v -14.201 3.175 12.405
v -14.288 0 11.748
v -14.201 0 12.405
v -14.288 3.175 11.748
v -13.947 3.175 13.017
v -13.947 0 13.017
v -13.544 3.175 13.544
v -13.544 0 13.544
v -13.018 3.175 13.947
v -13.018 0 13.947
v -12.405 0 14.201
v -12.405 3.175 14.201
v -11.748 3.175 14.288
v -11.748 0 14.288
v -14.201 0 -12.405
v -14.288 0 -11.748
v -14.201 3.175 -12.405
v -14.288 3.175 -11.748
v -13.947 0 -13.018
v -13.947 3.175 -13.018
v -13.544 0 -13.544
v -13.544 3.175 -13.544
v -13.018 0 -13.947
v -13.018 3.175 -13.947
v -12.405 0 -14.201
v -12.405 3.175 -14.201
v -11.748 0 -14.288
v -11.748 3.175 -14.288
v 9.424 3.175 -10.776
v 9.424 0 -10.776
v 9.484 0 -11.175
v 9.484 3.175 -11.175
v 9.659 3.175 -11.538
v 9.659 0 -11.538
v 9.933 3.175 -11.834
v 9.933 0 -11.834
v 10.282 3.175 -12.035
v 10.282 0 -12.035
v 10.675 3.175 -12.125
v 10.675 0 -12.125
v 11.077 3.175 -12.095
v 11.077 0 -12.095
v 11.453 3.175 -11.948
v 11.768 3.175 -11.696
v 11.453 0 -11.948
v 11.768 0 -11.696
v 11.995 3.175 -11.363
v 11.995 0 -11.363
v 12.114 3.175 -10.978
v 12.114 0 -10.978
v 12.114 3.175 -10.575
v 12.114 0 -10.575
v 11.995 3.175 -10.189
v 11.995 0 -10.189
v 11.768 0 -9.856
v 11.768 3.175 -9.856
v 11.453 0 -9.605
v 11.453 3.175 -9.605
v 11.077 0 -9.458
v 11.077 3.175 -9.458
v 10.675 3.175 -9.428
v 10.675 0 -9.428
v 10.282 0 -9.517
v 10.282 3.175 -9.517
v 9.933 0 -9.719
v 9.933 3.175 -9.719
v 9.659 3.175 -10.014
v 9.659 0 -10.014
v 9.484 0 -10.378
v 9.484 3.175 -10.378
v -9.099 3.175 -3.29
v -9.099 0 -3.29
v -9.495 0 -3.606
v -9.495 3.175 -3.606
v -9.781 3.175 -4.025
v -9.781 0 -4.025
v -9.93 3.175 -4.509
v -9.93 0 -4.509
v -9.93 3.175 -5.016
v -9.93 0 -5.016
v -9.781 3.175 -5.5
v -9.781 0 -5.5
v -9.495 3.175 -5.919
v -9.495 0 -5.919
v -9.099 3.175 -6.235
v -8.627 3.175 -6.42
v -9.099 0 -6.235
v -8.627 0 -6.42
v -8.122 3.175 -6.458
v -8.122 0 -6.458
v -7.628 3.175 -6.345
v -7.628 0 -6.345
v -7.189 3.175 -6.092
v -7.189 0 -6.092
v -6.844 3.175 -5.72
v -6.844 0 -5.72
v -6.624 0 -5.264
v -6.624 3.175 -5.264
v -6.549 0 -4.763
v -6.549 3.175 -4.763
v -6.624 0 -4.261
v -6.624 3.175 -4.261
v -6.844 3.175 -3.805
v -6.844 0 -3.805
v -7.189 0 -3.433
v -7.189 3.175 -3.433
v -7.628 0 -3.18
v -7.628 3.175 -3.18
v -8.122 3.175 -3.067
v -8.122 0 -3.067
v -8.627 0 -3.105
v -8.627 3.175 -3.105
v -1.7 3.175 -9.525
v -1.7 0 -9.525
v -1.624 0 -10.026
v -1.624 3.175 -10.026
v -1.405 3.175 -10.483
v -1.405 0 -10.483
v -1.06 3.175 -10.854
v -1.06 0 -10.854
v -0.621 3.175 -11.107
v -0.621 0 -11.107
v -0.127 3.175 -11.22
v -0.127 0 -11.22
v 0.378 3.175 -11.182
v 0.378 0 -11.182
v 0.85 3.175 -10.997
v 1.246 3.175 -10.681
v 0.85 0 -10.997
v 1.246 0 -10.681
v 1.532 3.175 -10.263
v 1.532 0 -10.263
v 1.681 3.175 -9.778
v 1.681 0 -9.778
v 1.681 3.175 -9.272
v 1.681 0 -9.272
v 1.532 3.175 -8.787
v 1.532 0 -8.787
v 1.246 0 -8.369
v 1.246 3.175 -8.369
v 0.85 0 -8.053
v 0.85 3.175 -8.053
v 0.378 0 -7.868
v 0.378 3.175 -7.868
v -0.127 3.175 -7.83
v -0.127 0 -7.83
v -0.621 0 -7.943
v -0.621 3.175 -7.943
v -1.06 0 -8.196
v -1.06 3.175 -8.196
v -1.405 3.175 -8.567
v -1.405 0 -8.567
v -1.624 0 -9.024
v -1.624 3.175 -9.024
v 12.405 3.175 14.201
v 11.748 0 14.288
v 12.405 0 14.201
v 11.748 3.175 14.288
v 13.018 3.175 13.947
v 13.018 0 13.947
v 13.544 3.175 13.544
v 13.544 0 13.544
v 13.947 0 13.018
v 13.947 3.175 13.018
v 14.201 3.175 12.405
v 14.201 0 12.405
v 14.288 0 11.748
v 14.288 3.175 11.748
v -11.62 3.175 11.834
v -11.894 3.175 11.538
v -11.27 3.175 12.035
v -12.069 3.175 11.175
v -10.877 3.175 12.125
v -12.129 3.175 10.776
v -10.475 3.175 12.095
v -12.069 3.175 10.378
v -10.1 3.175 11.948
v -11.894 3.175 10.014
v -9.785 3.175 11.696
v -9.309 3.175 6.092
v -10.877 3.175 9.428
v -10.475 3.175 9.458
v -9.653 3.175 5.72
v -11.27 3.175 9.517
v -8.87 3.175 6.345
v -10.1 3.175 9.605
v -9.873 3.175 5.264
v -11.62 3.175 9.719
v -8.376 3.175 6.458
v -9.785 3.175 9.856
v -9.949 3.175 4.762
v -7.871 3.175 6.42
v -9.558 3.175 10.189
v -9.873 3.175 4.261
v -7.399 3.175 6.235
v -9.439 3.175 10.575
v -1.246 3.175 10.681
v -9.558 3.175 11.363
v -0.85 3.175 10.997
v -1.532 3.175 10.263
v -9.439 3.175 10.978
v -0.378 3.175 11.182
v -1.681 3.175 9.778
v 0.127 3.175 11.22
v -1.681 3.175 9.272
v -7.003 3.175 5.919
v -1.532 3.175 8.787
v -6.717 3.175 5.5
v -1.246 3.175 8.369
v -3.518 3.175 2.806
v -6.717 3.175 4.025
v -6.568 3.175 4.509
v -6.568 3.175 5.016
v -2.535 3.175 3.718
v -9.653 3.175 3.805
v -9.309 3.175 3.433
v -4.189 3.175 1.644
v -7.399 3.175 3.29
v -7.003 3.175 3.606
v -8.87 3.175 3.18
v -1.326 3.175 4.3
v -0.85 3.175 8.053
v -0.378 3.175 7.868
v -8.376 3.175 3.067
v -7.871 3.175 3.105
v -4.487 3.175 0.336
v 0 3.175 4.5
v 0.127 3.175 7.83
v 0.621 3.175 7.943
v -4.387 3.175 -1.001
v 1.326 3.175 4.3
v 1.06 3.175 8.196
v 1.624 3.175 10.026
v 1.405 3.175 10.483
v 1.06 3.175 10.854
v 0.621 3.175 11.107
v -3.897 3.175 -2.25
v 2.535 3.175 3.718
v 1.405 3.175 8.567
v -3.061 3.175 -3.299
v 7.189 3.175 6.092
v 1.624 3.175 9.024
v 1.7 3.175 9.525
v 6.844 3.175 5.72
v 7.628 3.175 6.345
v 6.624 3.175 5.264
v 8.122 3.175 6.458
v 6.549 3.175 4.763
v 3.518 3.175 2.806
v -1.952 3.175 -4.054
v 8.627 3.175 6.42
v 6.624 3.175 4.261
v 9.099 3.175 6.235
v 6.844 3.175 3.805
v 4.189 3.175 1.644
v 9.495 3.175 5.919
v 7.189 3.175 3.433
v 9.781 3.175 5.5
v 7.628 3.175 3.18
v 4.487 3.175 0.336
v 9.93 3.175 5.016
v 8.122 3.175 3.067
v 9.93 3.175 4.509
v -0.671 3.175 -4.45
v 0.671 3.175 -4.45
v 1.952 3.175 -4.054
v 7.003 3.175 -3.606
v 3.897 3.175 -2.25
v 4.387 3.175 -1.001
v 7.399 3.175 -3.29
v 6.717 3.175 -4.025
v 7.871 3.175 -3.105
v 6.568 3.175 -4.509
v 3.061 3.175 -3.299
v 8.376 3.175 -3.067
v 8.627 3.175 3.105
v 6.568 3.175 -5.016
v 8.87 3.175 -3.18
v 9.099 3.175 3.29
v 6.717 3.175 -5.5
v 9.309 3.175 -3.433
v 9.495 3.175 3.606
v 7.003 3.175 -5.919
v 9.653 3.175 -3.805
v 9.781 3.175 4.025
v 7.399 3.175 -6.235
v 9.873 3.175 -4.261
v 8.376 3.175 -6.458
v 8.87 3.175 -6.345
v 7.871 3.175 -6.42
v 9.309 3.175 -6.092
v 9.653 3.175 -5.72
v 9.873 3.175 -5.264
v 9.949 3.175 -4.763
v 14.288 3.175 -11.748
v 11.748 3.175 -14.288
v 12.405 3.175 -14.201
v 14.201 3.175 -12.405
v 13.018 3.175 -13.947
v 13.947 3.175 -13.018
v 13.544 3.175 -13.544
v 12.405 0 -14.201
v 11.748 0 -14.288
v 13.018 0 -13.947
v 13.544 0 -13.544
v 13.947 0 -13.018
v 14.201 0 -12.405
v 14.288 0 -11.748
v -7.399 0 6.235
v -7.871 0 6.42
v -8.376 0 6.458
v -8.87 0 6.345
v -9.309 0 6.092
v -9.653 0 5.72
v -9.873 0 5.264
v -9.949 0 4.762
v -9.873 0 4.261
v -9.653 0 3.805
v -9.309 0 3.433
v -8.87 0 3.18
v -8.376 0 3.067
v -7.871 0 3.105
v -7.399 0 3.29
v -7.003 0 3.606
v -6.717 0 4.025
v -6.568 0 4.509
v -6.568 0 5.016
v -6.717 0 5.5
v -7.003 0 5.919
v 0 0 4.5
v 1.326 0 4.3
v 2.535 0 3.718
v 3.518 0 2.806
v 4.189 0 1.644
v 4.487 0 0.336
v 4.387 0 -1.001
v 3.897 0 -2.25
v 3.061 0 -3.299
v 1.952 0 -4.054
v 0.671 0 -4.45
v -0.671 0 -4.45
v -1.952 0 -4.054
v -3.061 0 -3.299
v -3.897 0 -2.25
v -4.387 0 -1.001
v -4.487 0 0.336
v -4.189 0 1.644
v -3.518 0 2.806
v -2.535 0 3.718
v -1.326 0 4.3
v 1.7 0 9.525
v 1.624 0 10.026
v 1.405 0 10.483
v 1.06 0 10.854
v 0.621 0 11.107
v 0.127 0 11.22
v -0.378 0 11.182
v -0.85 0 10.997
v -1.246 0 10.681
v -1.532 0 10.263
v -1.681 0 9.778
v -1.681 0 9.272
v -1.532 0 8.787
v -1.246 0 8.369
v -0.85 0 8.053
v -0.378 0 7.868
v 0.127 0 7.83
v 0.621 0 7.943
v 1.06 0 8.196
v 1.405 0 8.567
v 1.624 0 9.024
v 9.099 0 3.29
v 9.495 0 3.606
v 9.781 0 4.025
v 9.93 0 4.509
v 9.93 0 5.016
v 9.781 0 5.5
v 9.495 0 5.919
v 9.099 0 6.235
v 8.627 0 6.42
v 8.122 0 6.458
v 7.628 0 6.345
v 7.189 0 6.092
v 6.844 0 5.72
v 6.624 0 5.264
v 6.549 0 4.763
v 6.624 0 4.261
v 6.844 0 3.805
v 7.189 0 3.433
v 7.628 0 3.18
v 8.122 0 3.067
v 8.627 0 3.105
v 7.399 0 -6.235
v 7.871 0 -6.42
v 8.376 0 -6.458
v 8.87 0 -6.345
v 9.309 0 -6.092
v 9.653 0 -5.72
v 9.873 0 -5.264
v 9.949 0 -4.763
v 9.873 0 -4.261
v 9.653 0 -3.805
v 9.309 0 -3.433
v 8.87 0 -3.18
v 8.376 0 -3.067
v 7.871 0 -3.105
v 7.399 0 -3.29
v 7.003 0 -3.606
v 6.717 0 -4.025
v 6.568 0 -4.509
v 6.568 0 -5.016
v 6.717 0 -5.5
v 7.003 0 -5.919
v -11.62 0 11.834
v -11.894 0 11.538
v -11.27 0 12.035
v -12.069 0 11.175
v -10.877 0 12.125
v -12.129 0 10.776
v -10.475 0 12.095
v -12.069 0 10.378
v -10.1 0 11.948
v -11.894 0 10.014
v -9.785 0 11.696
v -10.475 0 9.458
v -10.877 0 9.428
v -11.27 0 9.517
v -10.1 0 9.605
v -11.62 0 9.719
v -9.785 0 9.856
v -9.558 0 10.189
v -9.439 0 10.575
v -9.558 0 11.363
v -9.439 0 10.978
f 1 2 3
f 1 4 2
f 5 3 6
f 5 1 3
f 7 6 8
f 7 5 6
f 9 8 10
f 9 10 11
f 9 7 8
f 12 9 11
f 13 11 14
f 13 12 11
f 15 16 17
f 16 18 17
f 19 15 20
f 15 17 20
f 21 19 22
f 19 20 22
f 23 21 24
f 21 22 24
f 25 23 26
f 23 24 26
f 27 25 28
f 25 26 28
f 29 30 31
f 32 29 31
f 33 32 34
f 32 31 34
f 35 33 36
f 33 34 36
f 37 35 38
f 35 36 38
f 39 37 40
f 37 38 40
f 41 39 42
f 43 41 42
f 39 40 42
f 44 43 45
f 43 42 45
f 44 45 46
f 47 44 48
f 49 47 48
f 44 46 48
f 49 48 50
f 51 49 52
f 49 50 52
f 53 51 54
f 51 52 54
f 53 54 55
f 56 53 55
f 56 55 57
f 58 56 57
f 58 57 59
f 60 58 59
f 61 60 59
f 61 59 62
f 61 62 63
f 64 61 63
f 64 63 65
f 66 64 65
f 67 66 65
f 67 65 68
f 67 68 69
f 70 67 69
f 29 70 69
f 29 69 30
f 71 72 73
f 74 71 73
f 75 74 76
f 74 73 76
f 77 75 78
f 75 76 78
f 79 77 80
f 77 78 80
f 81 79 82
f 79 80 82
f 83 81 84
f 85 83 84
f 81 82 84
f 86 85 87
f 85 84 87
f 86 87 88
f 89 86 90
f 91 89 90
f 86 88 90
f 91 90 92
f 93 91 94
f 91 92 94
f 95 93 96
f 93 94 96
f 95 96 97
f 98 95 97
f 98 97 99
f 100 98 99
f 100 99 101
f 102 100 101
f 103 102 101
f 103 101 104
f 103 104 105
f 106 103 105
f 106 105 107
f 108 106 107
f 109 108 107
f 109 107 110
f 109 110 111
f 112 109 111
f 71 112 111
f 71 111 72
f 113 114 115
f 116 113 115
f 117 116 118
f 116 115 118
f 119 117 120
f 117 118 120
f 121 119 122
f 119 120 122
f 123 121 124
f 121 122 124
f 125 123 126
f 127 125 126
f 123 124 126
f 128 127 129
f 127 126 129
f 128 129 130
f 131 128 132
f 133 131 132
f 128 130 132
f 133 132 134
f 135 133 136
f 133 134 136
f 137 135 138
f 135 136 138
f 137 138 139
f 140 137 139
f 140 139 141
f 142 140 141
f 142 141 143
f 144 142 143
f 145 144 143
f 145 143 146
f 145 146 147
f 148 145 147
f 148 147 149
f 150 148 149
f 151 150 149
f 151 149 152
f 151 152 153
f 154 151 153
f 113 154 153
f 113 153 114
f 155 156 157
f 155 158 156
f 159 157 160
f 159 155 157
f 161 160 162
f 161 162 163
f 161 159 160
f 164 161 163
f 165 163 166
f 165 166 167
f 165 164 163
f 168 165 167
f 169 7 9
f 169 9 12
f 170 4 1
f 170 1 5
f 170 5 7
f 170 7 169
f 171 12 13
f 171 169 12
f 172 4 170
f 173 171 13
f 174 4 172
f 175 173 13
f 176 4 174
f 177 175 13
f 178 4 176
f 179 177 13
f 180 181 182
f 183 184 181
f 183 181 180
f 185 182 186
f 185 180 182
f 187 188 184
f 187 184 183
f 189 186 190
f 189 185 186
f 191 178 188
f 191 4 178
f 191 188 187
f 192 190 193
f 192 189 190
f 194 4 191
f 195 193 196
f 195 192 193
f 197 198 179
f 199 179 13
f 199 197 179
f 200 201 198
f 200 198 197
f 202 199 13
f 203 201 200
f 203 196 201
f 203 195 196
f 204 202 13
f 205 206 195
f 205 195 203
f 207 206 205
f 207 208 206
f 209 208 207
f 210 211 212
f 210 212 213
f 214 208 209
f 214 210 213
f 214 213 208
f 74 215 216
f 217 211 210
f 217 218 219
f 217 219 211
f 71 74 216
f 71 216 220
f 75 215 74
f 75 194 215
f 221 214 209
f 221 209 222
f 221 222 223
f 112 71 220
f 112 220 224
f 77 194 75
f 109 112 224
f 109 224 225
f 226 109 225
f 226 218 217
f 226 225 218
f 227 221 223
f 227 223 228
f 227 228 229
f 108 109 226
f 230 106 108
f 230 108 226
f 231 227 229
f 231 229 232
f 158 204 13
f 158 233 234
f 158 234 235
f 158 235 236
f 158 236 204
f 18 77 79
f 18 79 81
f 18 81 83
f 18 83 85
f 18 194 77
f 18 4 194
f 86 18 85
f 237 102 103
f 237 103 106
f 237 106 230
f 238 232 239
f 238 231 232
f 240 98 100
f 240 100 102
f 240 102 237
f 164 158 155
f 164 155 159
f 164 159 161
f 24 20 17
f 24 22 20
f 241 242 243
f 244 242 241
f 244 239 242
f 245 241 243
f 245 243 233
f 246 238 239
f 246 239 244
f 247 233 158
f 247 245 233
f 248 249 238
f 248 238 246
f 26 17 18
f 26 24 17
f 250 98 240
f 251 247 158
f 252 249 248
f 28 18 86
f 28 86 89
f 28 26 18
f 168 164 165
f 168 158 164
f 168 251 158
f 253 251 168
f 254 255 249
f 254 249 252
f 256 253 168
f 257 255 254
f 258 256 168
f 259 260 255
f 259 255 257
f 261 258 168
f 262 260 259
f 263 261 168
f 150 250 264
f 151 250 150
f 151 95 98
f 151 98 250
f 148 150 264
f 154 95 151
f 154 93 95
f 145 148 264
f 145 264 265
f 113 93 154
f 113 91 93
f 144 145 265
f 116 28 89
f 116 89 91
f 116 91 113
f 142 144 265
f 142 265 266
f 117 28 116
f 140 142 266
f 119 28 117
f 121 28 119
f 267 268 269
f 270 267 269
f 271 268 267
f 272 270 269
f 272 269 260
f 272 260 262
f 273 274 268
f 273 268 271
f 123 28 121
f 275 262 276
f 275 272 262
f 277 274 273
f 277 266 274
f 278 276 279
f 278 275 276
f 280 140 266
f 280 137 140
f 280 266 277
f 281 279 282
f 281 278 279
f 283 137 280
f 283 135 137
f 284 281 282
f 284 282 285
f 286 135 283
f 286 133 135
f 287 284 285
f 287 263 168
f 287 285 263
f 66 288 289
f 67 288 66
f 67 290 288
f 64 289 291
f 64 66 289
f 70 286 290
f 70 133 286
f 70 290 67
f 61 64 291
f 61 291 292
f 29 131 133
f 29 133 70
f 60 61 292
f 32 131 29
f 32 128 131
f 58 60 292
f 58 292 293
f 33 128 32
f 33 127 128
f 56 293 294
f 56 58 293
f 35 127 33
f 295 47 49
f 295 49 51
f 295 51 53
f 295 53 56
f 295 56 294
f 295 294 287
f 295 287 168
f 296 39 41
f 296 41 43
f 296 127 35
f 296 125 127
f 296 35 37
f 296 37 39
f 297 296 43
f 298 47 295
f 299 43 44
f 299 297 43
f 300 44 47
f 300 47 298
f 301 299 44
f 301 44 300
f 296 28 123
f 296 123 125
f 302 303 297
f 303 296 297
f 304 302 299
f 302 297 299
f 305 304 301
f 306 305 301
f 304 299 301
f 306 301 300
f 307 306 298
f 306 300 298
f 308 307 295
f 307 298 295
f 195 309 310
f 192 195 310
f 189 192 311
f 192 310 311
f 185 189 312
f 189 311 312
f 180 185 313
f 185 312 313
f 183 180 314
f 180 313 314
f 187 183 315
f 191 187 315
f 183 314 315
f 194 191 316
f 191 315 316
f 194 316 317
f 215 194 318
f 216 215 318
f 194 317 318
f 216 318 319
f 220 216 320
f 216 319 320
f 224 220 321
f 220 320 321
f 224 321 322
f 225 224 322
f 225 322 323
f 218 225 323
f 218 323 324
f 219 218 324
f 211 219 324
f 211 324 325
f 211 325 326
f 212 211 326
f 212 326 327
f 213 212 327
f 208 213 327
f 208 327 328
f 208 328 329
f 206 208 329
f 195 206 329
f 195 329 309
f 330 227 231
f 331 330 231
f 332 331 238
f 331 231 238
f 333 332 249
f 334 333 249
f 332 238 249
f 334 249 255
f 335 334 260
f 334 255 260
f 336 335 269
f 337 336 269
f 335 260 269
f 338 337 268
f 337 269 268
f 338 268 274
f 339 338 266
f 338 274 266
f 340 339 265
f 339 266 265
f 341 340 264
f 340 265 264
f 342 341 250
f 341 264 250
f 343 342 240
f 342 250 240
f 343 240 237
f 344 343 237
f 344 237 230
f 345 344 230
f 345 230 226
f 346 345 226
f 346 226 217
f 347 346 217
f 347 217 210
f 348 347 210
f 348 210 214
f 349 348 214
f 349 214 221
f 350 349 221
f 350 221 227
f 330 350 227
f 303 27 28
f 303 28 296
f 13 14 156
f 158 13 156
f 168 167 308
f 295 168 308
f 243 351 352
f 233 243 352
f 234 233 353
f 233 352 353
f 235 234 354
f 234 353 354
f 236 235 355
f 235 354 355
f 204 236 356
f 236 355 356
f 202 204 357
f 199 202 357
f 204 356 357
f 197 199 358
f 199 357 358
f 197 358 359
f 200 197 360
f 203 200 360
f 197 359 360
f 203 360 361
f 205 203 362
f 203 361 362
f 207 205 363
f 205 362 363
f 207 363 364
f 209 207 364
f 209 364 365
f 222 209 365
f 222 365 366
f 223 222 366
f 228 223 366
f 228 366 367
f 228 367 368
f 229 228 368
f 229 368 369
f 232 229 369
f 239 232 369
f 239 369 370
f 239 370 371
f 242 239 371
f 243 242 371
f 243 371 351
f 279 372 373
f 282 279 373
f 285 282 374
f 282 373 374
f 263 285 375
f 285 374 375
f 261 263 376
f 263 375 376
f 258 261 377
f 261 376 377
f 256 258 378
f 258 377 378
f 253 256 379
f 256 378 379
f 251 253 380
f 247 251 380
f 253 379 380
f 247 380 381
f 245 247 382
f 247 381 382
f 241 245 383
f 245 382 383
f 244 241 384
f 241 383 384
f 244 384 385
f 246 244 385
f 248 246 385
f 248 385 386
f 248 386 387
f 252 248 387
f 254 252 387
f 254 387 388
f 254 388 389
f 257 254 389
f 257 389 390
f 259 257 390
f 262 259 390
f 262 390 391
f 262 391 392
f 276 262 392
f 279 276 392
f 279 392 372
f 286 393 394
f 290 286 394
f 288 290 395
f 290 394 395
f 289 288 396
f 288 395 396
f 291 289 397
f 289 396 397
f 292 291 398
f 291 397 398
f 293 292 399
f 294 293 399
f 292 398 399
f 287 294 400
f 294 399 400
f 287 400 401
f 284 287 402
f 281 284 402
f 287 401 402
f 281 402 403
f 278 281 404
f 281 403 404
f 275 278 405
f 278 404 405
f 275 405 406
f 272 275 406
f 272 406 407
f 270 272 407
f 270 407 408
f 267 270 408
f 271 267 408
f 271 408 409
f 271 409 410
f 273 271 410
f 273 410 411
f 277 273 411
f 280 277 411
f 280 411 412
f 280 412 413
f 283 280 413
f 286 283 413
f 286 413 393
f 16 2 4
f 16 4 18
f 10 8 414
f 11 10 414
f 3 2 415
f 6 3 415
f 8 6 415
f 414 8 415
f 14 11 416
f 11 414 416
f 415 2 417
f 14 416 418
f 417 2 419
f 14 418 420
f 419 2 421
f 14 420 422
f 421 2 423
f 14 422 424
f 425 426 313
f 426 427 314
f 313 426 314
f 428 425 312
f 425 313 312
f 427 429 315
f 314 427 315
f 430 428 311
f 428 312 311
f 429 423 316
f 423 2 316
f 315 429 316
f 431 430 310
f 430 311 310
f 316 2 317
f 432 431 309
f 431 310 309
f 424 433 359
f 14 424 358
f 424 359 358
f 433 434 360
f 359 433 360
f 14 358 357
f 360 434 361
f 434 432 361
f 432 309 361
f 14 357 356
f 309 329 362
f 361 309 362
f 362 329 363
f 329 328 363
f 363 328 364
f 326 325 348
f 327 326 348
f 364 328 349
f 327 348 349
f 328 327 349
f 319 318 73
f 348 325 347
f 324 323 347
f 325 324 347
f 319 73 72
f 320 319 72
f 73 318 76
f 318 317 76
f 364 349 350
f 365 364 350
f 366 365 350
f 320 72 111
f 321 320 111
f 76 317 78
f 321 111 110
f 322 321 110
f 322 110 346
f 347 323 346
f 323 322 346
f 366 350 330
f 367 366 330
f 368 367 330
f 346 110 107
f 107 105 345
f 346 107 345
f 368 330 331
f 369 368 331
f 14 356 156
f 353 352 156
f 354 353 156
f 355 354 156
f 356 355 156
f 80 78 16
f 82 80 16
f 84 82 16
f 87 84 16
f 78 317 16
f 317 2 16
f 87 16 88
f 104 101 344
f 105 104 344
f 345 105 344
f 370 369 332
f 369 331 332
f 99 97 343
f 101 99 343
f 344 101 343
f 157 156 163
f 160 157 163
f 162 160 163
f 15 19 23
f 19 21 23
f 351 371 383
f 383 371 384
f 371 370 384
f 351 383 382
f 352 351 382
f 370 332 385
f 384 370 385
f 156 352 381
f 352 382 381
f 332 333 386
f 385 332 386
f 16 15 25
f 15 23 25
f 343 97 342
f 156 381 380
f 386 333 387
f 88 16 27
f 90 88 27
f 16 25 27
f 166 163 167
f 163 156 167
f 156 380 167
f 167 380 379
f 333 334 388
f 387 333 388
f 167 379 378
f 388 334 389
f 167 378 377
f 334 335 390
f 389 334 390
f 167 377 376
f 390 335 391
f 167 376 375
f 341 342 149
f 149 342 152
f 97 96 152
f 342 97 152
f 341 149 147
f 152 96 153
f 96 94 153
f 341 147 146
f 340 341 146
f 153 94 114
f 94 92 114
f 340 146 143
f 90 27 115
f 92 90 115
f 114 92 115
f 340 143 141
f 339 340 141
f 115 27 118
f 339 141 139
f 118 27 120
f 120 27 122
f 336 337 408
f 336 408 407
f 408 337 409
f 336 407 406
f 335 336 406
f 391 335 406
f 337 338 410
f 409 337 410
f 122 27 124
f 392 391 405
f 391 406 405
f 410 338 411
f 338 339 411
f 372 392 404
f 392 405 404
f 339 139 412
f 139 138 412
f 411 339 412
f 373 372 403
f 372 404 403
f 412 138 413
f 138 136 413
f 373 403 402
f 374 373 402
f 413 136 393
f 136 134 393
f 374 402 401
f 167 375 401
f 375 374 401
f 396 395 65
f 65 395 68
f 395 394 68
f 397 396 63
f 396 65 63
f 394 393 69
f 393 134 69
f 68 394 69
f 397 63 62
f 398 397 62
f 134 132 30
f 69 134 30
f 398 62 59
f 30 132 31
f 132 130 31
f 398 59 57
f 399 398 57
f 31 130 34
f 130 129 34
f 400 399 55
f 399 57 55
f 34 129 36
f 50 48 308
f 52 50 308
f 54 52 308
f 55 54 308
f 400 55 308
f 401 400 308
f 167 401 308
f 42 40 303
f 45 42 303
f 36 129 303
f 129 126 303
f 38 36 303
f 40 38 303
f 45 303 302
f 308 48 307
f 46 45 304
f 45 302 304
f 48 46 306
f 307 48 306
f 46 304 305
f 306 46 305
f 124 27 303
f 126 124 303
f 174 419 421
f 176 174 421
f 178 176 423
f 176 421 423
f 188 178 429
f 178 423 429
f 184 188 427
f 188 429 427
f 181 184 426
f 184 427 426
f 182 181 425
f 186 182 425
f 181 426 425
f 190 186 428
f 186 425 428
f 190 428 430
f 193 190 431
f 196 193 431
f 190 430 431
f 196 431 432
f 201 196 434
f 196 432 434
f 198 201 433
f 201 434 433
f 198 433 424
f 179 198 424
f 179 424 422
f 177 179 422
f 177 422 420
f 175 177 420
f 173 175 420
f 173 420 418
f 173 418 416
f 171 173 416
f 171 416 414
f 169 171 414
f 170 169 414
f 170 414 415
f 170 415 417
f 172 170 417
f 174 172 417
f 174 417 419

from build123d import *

# Parameters (mm, degrees)
SKETCH1_W             = 28.575
SKETCH1_H             = 28.575
BOSS_EXTRUDE1_DEPTH   = 3.175
M3_CLEARANCE_HOLE1_D  = 3.4
SKETCH2_R             = 4.5
CUT_EXTRUDE2_DEPTH    = 21.453506729
CIRPATTERN1_COUNT     = 6
F_6_32_TAPPED_HOLE1_D = 2.7051
FILLET1_R             = 2.54


with BuildPart() as part:
    # Sketch1 → Boss-Extrude1 (new body)
    with BuildSketch(Plane(origin=(0, 0, 0), x_dir=(1, 0, 0), z_dir=(0, 1, 0))):
        Rectangle(SKETCH1_W, SKETCH1_H)
    extrude(amount=BOSS_EXTRUDE1_DEPTH)

    # M3 Clearance Hole1 (through all)
    with Locations(Plane(origin=(0, 3.175, 0), x_dir=(1, 0, 0), z_dir=(0, 1, 0))):
        with Locations((0, 9.525)):
            m3_clearance_hole1 = Hole(M3_CLEARANCE_HOLE1_D / 2)

    # Sketch2 → Cut-Extrude2 (cut, through all)
    with BuildSketch(Plane(origin=(0, 3.175, 0), x_dir=(1, 0, 0), z_dir=(0, 1, 0))):
        with Locations(Location((0, 0, 0), (0, 0, 270))):
            Circle(SKETCH2_R)
    extrude(amount=-CUT_EXTRUDE2_DEPTH, mode=Mode.SUBTRACT)

    # CirPattern1: M3 Clearance Hole1 ×6 about axis
    cirpattern1_axis = Axis((0, 0, 0), (0, 1, 0))
    for i in range(1, CIRPATTERN1_COUNT):
        add(m3_clearance_hole1.rotate(cirpattern1_axis, i * 360 / CIRPATTERN1_COUNT), mode=Mode.SUBTRACT)

    # #6-32 Tapped Hole1 (through all)
    with Locations(Plane(origin=(0, 3.175, 0), x_dir=(1, 0, 0), z_dir=(0, 1, 0))):
        with Locations((10.776307345, 10.776307345), (-10.776307345, -10.776307345)):
            Hole(F_6_32_TAPPED_HOLE1_D / 2)

    # Fillet1
    fillet1_edges = [part.edges().sort_by_distance(p)[0] for p in [
        (14.2875, 1.5875, 14.2875),
        (-14.2875, 1.5875, 14.2875),
        (-14.2875, 1.5875, -14.2875),
        (14.2875, 1.5875, -14.2875),
    ]]
    fillet(fillet1_edges, radius=FILLET1_R)


solid = part.part
